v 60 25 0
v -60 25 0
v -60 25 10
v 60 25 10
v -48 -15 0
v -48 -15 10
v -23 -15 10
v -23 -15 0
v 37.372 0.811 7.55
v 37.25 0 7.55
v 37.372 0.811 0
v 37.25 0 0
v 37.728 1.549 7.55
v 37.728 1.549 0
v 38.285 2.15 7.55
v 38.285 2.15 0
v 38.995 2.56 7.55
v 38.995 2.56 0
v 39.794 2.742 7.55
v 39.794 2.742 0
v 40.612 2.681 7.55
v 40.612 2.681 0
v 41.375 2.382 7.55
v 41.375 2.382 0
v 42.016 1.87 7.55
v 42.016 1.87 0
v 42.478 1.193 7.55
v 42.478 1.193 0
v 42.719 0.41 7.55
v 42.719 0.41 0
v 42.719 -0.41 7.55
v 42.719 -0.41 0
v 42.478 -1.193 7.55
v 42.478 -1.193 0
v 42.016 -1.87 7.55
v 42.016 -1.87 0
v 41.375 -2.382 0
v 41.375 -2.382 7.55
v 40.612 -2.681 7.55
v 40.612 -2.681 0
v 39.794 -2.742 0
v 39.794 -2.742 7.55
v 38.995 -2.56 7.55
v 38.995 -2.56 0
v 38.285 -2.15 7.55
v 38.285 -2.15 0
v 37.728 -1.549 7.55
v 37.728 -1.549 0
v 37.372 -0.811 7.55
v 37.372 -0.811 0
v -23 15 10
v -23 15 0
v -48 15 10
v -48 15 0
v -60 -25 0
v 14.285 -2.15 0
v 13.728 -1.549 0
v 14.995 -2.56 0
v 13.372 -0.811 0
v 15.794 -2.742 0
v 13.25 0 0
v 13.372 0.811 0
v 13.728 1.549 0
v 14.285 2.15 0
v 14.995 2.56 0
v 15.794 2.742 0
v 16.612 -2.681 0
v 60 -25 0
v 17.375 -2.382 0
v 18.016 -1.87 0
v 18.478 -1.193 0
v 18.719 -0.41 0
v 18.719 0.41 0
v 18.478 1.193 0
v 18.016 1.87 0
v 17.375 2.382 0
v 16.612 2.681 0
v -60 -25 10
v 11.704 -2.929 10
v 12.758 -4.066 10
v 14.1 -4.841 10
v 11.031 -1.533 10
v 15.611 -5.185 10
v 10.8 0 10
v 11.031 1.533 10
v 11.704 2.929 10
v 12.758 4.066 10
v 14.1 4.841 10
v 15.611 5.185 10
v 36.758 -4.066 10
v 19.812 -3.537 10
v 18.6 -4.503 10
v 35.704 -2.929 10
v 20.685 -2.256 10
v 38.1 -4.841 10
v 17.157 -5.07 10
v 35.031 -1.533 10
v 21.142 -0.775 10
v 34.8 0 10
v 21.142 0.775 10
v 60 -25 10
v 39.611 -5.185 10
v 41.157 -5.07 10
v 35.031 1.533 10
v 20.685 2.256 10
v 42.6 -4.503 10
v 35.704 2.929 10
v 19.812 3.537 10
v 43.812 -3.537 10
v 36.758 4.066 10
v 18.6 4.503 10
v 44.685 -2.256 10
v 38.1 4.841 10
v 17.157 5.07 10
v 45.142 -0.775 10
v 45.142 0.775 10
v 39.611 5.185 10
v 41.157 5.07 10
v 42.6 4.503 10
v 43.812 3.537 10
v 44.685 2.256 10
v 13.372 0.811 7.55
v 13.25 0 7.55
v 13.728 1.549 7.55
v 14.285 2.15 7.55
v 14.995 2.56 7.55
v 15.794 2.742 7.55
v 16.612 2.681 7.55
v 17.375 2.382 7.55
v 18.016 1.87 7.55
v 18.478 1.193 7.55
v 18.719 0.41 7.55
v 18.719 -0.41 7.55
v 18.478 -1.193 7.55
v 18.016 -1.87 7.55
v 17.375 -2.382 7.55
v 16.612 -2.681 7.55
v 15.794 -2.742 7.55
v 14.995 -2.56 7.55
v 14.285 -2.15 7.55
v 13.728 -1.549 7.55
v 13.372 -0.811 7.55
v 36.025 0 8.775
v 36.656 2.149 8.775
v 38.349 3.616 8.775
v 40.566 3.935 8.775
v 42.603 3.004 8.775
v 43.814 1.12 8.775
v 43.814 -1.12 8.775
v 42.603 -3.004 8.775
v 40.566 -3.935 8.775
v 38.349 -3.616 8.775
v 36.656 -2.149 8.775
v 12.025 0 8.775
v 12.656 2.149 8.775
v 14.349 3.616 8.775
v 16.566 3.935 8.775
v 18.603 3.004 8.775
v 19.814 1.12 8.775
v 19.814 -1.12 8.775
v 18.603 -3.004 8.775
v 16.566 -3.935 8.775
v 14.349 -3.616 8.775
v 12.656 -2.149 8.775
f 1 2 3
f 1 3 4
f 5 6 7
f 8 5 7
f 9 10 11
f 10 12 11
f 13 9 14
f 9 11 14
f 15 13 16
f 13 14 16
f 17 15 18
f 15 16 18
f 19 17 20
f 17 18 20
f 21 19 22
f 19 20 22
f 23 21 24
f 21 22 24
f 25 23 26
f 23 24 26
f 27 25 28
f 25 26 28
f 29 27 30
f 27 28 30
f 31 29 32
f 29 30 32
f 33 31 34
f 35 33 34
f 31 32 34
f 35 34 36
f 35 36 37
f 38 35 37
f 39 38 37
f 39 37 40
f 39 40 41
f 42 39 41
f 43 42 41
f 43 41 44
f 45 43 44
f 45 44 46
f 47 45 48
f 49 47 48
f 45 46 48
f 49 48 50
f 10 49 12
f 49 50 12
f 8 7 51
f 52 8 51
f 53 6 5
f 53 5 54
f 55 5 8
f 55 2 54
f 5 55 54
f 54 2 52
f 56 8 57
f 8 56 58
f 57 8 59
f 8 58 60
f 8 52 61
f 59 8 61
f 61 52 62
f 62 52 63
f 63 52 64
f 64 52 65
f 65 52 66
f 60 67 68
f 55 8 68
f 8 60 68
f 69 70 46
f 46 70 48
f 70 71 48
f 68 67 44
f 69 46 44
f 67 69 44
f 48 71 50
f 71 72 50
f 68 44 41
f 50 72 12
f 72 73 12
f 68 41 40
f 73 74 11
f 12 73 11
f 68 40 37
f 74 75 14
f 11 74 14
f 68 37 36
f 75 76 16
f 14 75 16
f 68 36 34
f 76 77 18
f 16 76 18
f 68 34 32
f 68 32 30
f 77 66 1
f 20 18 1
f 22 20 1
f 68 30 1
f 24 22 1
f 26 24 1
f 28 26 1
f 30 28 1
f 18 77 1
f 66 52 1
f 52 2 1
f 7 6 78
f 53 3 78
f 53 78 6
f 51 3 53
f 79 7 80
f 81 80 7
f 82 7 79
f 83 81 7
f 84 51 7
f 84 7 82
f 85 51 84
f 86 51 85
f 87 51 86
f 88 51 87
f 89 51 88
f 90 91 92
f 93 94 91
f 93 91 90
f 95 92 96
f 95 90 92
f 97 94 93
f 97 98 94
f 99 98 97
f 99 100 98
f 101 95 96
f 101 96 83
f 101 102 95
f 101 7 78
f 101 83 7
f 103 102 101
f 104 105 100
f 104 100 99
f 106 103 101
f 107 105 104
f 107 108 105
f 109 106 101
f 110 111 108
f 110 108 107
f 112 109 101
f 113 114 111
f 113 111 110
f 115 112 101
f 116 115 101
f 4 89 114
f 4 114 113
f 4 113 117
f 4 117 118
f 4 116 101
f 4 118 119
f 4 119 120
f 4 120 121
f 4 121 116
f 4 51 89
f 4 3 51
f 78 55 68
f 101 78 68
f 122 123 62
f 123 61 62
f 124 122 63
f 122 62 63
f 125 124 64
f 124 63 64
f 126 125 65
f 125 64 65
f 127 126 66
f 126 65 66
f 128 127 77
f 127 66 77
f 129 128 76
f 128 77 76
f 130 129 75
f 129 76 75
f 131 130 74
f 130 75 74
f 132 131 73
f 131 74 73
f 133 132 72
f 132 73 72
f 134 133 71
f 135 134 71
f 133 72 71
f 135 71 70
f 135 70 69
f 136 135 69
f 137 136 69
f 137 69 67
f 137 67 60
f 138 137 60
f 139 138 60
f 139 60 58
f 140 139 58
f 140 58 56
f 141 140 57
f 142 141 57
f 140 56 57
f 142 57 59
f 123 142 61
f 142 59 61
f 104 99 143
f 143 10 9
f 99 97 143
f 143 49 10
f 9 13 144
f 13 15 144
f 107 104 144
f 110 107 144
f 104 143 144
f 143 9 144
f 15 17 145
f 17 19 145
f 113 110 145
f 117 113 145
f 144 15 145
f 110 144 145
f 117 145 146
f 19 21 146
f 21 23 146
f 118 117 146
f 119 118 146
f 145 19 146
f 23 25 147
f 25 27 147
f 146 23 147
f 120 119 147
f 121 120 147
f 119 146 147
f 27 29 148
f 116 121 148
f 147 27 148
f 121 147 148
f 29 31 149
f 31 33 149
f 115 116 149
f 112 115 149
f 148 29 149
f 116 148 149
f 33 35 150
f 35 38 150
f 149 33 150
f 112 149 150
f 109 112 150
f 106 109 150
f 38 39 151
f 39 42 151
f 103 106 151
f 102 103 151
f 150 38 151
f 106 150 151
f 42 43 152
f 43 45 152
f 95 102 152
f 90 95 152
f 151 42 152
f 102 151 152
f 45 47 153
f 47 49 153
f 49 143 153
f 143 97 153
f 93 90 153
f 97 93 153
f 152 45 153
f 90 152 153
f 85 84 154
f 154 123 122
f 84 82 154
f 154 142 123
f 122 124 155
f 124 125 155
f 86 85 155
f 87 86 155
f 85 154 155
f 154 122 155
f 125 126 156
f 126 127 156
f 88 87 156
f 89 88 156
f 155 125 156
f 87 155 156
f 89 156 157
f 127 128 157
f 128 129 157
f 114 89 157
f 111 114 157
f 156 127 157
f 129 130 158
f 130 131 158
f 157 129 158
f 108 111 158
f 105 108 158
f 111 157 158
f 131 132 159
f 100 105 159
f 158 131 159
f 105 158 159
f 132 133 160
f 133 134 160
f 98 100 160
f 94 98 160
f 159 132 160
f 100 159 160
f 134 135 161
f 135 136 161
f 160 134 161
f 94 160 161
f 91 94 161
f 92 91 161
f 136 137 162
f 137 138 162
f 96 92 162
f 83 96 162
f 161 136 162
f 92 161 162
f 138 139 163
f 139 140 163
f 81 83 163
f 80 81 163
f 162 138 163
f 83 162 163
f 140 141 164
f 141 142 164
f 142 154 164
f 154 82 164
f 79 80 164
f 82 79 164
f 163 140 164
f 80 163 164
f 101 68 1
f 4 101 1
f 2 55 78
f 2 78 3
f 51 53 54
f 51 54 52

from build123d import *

# Parameters (mm, degrees)
ESQUISSE1_W                                         = 120
ESQUISSE1_H                                         = 50
BOSS_EXTRU_1_DEPTH                                  = 10
ESQUISSE2_W                                         = 25
ESQUISSE2_H                                         = 30
ENL_V_MAT_EXTRU_1_DEPTH                             = 10
CSK_FOR_M5_COUNTERSUNK_FLAT_HEAD_SCREW1_D           = 5.5
CSK_FOR_M5_COUNTERSUNK_FLAT_HEAD_SCREW1_CSINK_D     = 10.4
CSK_FOR_M5_COUNTERSUNK_FLAT_HEAD_SCREW1_CSINK_ANGLE = 90


with BuildPart() as part:
    # Esquisse1 → Boss.-Extru.1 (new body)
    with BuildSketch(Plane.XY):
        Rectangle(ESQUISSE1_W, ESQUISSE1_H)
    extrude(amount=BOSS_EXTRU_1_DEPTH)

    # Esquisse2 → Enlèv. mat.-Extru.1 (cut)
    with BuildSketch(Plane.XY.offset(10)):
        with Locations((-35.5, 0)):
            Rectangle(ESQUISSE2_W, ESQUISSE2_H)
    extrude(amount=-ENL_V_MAT_EXTRU_1_DEPTH, mode=Mode.SUBTRACT)

    # CSK for M5 Countersunk Flat Head Screw1 (through all)
    with Locations(Plane.XY.offset(10)):
        with Locations((16, 0), (40, 0)):
            CounterSinkHole(CSK_FOR_M5_COUNTERSUNK_FLAT_HEAD_SCREW1_D / 2, CSK_FOR_M5_COUNTERSUNK_FLAT_HEAD_SCREW1_CSINK_D / 2, counter_sink_angle=CSK_FOR_M5_COUNTERSUNK_FLAT_HEAD_SCREW1_CSINK_ANGLE)


solid = part.part
